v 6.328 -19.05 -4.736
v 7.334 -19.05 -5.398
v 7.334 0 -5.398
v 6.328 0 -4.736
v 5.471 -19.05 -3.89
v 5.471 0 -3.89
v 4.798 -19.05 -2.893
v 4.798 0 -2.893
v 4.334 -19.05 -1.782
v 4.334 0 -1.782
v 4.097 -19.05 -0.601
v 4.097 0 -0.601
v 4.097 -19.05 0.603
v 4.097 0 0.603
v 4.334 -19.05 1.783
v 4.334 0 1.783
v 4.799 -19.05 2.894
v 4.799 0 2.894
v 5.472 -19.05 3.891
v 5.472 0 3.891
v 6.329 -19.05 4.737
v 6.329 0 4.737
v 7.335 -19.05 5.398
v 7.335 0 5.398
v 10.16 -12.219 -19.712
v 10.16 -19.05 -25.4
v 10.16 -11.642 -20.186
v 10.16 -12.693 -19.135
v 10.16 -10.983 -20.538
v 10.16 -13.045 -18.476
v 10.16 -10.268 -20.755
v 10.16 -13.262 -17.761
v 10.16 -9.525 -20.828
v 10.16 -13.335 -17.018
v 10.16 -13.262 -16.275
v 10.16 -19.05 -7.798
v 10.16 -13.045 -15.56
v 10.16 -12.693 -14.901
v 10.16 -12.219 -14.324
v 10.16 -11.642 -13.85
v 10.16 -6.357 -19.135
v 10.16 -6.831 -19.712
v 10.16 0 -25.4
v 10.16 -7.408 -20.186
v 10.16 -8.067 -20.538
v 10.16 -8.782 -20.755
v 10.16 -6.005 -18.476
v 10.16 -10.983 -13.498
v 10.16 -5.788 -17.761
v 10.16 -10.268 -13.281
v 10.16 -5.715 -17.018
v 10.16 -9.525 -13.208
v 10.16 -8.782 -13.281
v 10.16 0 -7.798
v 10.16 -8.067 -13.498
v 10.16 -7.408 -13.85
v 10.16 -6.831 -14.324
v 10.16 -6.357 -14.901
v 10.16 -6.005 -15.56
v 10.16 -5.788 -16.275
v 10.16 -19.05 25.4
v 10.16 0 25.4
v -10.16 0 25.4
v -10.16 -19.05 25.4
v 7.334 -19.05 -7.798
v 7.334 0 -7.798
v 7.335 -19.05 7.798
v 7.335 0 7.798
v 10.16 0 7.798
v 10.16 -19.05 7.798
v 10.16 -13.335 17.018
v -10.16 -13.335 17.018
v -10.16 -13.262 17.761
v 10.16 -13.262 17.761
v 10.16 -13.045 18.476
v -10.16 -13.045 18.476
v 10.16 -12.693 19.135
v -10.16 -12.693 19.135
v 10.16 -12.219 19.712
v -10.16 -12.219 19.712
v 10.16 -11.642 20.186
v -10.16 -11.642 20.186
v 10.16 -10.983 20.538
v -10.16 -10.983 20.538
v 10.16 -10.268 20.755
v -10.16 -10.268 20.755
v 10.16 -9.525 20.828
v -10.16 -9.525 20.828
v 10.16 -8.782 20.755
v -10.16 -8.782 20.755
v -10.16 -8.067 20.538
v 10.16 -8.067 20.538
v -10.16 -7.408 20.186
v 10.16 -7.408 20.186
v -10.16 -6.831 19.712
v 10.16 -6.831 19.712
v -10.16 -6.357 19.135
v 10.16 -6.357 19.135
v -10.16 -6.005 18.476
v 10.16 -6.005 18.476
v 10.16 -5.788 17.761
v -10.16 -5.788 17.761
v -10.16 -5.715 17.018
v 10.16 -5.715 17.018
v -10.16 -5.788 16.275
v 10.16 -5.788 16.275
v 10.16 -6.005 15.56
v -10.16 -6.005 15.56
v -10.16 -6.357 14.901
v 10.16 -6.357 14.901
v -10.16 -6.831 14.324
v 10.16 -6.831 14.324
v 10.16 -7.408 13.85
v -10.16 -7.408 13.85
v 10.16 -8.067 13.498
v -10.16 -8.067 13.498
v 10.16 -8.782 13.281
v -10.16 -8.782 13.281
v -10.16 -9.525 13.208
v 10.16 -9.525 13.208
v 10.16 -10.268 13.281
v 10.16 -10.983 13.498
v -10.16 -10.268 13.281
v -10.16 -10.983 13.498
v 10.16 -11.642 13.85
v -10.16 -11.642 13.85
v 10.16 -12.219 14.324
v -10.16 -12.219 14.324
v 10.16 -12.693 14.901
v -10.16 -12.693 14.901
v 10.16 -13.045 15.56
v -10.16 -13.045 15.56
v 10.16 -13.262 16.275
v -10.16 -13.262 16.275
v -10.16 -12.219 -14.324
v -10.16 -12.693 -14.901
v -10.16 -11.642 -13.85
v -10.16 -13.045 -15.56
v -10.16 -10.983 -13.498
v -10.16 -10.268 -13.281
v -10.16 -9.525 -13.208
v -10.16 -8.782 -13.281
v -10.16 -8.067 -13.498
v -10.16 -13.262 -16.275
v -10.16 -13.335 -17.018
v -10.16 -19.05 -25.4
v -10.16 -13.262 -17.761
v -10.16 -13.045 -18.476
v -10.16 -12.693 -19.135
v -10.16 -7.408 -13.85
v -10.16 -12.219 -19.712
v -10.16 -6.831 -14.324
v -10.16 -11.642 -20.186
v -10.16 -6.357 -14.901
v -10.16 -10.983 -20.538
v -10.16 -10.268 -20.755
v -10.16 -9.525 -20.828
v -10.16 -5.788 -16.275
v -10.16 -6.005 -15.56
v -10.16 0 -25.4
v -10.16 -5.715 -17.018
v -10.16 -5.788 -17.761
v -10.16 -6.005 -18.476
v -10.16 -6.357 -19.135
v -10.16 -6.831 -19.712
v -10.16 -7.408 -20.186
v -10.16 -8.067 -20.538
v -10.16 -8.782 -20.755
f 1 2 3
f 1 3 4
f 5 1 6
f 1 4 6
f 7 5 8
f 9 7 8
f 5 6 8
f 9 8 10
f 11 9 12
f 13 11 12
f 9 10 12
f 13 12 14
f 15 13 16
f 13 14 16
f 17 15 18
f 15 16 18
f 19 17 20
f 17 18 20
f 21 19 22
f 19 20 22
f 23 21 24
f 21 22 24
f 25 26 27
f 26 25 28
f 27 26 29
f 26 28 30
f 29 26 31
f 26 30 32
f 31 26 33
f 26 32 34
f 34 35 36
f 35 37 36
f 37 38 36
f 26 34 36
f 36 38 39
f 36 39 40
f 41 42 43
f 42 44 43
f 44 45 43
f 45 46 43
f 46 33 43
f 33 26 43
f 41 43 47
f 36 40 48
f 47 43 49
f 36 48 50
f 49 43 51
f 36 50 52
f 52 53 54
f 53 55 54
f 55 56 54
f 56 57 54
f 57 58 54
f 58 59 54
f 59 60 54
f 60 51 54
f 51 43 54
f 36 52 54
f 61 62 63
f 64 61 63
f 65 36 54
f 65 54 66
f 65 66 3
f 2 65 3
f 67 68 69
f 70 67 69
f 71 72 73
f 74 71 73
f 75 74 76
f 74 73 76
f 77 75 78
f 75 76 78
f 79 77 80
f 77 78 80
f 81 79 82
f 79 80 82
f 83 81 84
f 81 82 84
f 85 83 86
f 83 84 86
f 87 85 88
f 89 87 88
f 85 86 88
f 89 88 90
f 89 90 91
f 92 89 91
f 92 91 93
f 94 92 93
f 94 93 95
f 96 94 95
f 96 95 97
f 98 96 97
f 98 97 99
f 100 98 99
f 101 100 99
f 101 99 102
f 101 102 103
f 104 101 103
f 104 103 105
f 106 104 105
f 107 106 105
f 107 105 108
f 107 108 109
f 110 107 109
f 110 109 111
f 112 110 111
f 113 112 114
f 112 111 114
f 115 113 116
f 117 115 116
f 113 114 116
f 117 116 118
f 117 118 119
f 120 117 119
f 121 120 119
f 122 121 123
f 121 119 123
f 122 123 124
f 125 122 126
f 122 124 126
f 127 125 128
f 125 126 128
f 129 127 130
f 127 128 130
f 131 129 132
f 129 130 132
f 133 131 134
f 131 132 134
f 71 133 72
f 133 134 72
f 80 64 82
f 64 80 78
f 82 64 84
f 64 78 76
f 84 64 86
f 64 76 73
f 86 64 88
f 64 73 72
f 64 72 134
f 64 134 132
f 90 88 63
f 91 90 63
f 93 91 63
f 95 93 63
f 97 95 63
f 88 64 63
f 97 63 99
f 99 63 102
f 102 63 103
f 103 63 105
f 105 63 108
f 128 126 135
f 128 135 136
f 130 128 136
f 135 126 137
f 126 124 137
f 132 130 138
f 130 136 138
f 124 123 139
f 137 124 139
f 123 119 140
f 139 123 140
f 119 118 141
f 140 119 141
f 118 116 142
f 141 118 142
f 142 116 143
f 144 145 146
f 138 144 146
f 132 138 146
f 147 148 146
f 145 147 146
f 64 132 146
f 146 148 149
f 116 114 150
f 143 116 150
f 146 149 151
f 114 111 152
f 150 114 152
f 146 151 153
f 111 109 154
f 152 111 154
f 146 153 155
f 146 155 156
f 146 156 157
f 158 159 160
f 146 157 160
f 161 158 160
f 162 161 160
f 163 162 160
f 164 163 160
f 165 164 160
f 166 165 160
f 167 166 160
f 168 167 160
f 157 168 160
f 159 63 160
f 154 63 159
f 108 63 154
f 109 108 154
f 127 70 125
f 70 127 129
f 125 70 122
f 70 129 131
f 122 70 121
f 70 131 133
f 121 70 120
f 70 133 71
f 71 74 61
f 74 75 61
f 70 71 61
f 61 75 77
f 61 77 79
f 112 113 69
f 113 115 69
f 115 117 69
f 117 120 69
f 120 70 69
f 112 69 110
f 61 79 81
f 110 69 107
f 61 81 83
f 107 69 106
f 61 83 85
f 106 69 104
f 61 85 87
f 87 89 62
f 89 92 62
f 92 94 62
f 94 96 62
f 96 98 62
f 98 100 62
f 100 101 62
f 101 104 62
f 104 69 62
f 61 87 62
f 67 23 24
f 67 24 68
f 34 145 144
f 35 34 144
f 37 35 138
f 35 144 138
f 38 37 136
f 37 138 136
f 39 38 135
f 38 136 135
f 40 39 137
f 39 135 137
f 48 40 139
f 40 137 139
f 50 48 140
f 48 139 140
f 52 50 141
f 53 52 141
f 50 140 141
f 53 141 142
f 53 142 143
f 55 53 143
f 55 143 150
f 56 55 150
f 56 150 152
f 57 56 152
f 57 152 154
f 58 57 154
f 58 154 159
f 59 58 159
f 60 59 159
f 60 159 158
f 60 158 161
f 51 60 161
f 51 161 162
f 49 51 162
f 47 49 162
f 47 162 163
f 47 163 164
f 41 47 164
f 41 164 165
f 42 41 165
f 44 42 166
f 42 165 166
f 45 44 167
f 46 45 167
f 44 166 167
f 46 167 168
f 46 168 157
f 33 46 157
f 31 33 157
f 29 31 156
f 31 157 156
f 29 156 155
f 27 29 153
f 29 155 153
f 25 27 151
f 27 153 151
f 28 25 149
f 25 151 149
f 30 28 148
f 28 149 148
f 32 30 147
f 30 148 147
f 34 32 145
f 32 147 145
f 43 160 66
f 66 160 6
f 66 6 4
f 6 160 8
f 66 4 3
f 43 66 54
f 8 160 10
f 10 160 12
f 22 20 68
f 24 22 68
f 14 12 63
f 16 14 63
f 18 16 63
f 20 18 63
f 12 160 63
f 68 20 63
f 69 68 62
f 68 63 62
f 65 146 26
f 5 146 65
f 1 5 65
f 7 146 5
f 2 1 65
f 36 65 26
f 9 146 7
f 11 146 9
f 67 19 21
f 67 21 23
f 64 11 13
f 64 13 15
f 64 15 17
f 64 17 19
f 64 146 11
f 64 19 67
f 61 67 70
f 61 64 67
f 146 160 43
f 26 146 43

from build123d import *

# Parameters (mm, degrees)
F1_DEPTH = 19.05
F2_R     = 3.81
F3_DEPTH = 25.4


with BuildPart() as f1:
    # F0 (on Front) → F1 (new body)
    with BuildSketch(Plane.XZ):
        with BuildLine():
            Line((10.16, 7.7975), (10.16, 25.4))
            Line((10.16, 25.4), (-10.16, 25.4))
            Line((-10.16, 25.4), (-10.16, -25.4))
            Line((-10.16, -25.4), (10.16, -25.4))
            Line((10.16, -25.4), (10.16, -7.7975))
            Line((10.16, -7.7975), (7.334133, -7.7975))
            Line((7.334133, -7.7975), (7.334133, -5.3975))
            ThreePointArc((7.334133, -5.3975), (4.067502, 0.000618), (7.335229, 5.398074))
            Line((7.335229, 5.398074), (7.335229, 7.7975))
            Line((7.335229, 7.7975), (10.16, 7.7975))
        make_face()
    extrude(amount=F1_DEPTH)

    # F2 (on face) → F3 (cut)
    with BuildSketch(Plane(origin=(-10.16, 0, 0), x_dir=(0, -1, 0), z_dir=(-1, 0, 0))):
        with Locations((9.525, 17.018)):
            Circle(F2_R)
        with Locations((9.525, -17.018)):
            Circle(F2_R)
    extrude(amount=-F3_DEPTH, mode=Mode.SUBTRACT)


solid = f1.part
